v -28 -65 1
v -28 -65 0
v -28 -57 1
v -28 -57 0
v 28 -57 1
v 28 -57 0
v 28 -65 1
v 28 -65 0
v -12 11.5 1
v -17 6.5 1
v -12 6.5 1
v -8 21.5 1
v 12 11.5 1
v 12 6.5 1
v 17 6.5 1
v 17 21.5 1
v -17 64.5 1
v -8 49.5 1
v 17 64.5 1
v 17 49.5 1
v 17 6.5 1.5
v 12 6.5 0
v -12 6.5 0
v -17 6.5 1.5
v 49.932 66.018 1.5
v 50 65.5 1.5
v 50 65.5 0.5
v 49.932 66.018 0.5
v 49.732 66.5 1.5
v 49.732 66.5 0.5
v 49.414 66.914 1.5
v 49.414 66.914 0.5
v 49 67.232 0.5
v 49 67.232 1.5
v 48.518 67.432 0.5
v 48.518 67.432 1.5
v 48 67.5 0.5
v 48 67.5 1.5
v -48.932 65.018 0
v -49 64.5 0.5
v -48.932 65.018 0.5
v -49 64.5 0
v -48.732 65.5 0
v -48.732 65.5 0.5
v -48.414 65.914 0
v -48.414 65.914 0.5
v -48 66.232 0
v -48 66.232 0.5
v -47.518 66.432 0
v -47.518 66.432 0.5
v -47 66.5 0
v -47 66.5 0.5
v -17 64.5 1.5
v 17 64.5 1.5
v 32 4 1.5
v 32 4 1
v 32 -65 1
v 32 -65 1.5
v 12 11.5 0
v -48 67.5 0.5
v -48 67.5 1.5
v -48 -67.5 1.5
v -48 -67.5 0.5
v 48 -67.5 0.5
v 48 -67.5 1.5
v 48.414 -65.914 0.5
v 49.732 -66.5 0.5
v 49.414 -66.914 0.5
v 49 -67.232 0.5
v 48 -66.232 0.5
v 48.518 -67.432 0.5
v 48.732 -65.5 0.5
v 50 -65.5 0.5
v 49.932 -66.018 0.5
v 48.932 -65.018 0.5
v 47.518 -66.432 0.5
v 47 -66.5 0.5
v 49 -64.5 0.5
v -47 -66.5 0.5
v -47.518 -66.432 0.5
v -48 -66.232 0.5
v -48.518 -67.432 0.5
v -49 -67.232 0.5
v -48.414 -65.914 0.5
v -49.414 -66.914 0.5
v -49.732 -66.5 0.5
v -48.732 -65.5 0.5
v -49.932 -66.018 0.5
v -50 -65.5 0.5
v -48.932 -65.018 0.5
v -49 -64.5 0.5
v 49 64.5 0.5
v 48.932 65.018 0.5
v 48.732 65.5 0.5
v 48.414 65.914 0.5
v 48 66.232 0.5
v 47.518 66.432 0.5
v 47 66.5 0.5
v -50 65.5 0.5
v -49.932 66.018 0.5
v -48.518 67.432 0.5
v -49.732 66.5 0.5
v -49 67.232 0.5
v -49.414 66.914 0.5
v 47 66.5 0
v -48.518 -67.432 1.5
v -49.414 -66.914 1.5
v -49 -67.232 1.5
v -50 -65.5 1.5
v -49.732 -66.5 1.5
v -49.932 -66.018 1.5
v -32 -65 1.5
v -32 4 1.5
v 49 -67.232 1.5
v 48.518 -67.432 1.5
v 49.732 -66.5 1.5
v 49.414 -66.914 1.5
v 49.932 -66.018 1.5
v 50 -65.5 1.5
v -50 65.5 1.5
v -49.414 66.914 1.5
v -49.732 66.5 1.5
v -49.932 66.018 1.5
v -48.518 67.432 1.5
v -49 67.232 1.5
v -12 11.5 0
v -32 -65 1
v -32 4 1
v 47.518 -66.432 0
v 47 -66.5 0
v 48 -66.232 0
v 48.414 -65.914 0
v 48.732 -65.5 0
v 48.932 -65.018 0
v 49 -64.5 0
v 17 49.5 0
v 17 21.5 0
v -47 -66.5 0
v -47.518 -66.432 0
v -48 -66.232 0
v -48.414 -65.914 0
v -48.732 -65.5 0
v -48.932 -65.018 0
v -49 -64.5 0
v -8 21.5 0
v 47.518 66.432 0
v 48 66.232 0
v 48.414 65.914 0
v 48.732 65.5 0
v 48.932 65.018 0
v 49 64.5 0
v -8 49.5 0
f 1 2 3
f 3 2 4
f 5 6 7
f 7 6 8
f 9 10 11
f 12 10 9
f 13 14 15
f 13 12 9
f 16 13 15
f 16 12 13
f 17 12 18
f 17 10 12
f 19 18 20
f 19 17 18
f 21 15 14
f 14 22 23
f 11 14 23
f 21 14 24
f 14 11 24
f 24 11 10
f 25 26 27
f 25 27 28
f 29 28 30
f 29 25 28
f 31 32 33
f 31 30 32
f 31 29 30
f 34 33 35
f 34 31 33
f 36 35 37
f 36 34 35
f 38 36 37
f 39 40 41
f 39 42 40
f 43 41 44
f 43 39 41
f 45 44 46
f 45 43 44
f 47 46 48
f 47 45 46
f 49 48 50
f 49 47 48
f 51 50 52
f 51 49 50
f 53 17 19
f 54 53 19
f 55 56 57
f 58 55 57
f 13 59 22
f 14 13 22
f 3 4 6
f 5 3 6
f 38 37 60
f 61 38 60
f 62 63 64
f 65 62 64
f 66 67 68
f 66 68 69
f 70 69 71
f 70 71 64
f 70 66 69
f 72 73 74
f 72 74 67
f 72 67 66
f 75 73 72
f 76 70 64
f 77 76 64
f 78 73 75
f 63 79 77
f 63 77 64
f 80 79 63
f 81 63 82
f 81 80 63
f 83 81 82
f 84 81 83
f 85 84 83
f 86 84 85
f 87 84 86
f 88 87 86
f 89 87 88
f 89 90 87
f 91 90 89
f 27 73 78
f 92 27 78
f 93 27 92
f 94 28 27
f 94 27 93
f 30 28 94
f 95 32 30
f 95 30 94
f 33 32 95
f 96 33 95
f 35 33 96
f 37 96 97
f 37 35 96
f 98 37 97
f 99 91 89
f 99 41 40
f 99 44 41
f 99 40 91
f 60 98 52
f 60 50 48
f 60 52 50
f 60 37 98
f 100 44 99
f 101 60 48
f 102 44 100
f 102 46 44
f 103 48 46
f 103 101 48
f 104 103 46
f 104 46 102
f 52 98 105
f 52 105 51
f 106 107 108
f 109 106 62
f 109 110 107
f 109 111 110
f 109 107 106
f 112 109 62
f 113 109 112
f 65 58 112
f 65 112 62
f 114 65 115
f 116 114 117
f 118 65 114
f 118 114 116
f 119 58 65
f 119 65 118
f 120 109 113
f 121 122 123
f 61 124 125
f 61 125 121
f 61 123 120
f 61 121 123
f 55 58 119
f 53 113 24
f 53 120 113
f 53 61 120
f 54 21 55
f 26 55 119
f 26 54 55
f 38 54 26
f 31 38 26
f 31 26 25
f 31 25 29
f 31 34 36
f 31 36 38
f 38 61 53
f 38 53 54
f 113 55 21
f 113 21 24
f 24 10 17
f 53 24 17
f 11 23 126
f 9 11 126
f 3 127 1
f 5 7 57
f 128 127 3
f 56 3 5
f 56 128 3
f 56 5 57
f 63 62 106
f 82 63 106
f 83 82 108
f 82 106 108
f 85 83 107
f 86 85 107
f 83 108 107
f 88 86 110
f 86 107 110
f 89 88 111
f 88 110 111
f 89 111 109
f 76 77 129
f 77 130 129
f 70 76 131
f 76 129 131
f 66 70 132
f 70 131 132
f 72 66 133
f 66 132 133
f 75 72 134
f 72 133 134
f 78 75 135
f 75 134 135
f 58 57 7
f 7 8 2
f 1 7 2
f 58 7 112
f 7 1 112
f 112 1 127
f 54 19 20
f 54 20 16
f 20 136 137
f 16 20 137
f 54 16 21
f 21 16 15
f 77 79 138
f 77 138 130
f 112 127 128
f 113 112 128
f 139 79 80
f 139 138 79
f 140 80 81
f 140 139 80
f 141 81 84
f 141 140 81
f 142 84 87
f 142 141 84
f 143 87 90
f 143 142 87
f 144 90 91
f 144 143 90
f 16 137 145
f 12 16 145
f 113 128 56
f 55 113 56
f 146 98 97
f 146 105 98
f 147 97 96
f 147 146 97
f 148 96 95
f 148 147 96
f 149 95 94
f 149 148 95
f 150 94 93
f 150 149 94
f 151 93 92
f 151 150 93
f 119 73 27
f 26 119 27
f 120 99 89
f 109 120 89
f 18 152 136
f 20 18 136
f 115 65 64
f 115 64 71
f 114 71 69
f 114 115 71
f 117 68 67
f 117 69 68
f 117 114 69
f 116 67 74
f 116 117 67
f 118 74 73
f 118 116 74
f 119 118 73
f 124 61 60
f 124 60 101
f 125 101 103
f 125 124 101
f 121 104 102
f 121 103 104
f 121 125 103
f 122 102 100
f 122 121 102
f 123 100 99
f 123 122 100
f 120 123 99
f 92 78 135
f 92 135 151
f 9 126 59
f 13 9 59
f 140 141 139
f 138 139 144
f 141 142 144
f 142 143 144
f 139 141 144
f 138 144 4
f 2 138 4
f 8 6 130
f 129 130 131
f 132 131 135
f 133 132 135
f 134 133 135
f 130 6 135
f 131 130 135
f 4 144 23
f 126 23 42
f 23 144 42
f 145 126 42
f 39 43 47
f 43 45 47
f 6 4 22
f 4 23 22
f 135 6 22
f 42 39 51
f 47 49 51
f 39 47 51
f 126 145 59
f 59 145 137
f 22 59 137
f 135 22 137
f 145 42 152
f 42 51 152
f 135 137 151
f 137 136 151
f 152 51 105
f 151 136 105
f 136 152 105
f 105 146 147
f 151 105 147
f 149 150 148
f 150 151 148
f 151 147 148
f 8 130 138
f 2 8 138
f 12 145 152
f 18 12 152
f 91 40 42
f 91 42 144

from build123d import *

# Parameters (mm, degrees)
BOSS_EXTRUDE2_DEPTH = 1.5
BOSS_EXTRUDE3_DEPTH = 1
FILLET1_R           = 2
CUT_EXTRUDE1_START  = -0.5
SKETCH2_W           = 98
SKETCH2_H           = 133
CUT_EXTRUDE1_DEPTH  = 0.5
FILLET2_R           = 2


with BuildPart() as part:
    # Sketch1 → Boss-Extrude2 (new body)
    with BuildSketch(Plane.XY):
        Polygon((-50, -67.5), (0, -67.5), (50, -67.5), (50, 67.5), (0, 67.5), (-50, 67.5), align=None)
        Polygon((28, -65), (0, -65), (-28, -65), (-32, -65), (-32, 4), (32, 4), (32, -65), align=None, mode=Mode.SUBTRACT)
        Polygon((-17, 64.5), (0, 64.5), (17, 64.5), (17, 49.5), (17, 21.5), (17, 6.5), (12, 6.5), (0, 6.5), (-12, 6.5), (-17, 6.5), align=None, mode=Mode.SUBTRACT)
    extrude(amount=BOSS_EXTRUDE2_DEPTH)

    # Sketch1<5> → Boss-Extrude3 (add)
    with BuildSketch(Plane.XY):
        Polygon((17, 64.5), (-17, 64.5), (-17, 6.5), (-12, 6.5), (-12, 11.5), (12, 11.5), (12, 6.5), (17, 6.5), (17, 21.5), (-8, 21.5), (-8, 49.5), (17, 49.5), align=None)
        Polygon((-28, -57), (0, -57), (28, -57), (28, -65), (32, -65), (32, 4), (-32, 4), (-32, -65), (-28, -65), align=None)
    extrude(amount=BOSS_EXTRUDE3_DEPTH)

    # Fillet1
    fillet1_edges = [part.edges().sort_by_distance(p)[0] for p in [
        (50, 67.5, 0.75),
        (-50, 67.5, 0.75),
        (50, -67.5, 0.75),
        (-50, -67.5, 0.75),
    ]]
    fillet(fillet1_edges, radius=FILLET1_R)

    # Sketch2 → Cut-Extrude1 (cut)
    with BuildSketch(Plane(origin=(0, 0, 0), x_dir=(-1, 0, 0), z_dir=(0, 0, -1)).offset(CUT_EXTRUDE1_START)):
        with BuildLine():
            Line((-48, -67.5), (48, -67.5))
            ThreePointArc((48, -67.5), (49.414213562, -66.914213562), (50, -65.5))
            Line((50, -65.5), (50, 65.5))
            ThreePointArc((50, 65.5), (49.414213562, 66.914213562), (48, 67.5))
            Line((48, 67.5), (-48, 67.5))
            ThreePointArc((-48, 67.5), (-49.414213562, 66.914213562), (-50, 65.5))
            Line((-50, 65.5), (-50, -65.5))
            ThreePointArc((-50, -65.5), (-49.414213562, -66.914213562), (-48, -67.5))
        make_face()
        Rectangle(SKETCH2_W, SKETCH2_H, mode=Mode.SUBTRACT)
    extrude(amount=CUT_EXTRUDE1_DEPTH, mode=Mode.SUBTRACT)

    # Fillet2
    fillet2_edges = [part.edges().sort_by_distance(p)[0] for p in [
        (49, -66.5, 0.25),
        (-49, -66.5, 0.25),
        (-49, 66.5, 0.25),
        (49, 66.5, 0.25),
    ]]
    fillet(fillet2_edges, radius=FILLET2_R)


solid = part.part
